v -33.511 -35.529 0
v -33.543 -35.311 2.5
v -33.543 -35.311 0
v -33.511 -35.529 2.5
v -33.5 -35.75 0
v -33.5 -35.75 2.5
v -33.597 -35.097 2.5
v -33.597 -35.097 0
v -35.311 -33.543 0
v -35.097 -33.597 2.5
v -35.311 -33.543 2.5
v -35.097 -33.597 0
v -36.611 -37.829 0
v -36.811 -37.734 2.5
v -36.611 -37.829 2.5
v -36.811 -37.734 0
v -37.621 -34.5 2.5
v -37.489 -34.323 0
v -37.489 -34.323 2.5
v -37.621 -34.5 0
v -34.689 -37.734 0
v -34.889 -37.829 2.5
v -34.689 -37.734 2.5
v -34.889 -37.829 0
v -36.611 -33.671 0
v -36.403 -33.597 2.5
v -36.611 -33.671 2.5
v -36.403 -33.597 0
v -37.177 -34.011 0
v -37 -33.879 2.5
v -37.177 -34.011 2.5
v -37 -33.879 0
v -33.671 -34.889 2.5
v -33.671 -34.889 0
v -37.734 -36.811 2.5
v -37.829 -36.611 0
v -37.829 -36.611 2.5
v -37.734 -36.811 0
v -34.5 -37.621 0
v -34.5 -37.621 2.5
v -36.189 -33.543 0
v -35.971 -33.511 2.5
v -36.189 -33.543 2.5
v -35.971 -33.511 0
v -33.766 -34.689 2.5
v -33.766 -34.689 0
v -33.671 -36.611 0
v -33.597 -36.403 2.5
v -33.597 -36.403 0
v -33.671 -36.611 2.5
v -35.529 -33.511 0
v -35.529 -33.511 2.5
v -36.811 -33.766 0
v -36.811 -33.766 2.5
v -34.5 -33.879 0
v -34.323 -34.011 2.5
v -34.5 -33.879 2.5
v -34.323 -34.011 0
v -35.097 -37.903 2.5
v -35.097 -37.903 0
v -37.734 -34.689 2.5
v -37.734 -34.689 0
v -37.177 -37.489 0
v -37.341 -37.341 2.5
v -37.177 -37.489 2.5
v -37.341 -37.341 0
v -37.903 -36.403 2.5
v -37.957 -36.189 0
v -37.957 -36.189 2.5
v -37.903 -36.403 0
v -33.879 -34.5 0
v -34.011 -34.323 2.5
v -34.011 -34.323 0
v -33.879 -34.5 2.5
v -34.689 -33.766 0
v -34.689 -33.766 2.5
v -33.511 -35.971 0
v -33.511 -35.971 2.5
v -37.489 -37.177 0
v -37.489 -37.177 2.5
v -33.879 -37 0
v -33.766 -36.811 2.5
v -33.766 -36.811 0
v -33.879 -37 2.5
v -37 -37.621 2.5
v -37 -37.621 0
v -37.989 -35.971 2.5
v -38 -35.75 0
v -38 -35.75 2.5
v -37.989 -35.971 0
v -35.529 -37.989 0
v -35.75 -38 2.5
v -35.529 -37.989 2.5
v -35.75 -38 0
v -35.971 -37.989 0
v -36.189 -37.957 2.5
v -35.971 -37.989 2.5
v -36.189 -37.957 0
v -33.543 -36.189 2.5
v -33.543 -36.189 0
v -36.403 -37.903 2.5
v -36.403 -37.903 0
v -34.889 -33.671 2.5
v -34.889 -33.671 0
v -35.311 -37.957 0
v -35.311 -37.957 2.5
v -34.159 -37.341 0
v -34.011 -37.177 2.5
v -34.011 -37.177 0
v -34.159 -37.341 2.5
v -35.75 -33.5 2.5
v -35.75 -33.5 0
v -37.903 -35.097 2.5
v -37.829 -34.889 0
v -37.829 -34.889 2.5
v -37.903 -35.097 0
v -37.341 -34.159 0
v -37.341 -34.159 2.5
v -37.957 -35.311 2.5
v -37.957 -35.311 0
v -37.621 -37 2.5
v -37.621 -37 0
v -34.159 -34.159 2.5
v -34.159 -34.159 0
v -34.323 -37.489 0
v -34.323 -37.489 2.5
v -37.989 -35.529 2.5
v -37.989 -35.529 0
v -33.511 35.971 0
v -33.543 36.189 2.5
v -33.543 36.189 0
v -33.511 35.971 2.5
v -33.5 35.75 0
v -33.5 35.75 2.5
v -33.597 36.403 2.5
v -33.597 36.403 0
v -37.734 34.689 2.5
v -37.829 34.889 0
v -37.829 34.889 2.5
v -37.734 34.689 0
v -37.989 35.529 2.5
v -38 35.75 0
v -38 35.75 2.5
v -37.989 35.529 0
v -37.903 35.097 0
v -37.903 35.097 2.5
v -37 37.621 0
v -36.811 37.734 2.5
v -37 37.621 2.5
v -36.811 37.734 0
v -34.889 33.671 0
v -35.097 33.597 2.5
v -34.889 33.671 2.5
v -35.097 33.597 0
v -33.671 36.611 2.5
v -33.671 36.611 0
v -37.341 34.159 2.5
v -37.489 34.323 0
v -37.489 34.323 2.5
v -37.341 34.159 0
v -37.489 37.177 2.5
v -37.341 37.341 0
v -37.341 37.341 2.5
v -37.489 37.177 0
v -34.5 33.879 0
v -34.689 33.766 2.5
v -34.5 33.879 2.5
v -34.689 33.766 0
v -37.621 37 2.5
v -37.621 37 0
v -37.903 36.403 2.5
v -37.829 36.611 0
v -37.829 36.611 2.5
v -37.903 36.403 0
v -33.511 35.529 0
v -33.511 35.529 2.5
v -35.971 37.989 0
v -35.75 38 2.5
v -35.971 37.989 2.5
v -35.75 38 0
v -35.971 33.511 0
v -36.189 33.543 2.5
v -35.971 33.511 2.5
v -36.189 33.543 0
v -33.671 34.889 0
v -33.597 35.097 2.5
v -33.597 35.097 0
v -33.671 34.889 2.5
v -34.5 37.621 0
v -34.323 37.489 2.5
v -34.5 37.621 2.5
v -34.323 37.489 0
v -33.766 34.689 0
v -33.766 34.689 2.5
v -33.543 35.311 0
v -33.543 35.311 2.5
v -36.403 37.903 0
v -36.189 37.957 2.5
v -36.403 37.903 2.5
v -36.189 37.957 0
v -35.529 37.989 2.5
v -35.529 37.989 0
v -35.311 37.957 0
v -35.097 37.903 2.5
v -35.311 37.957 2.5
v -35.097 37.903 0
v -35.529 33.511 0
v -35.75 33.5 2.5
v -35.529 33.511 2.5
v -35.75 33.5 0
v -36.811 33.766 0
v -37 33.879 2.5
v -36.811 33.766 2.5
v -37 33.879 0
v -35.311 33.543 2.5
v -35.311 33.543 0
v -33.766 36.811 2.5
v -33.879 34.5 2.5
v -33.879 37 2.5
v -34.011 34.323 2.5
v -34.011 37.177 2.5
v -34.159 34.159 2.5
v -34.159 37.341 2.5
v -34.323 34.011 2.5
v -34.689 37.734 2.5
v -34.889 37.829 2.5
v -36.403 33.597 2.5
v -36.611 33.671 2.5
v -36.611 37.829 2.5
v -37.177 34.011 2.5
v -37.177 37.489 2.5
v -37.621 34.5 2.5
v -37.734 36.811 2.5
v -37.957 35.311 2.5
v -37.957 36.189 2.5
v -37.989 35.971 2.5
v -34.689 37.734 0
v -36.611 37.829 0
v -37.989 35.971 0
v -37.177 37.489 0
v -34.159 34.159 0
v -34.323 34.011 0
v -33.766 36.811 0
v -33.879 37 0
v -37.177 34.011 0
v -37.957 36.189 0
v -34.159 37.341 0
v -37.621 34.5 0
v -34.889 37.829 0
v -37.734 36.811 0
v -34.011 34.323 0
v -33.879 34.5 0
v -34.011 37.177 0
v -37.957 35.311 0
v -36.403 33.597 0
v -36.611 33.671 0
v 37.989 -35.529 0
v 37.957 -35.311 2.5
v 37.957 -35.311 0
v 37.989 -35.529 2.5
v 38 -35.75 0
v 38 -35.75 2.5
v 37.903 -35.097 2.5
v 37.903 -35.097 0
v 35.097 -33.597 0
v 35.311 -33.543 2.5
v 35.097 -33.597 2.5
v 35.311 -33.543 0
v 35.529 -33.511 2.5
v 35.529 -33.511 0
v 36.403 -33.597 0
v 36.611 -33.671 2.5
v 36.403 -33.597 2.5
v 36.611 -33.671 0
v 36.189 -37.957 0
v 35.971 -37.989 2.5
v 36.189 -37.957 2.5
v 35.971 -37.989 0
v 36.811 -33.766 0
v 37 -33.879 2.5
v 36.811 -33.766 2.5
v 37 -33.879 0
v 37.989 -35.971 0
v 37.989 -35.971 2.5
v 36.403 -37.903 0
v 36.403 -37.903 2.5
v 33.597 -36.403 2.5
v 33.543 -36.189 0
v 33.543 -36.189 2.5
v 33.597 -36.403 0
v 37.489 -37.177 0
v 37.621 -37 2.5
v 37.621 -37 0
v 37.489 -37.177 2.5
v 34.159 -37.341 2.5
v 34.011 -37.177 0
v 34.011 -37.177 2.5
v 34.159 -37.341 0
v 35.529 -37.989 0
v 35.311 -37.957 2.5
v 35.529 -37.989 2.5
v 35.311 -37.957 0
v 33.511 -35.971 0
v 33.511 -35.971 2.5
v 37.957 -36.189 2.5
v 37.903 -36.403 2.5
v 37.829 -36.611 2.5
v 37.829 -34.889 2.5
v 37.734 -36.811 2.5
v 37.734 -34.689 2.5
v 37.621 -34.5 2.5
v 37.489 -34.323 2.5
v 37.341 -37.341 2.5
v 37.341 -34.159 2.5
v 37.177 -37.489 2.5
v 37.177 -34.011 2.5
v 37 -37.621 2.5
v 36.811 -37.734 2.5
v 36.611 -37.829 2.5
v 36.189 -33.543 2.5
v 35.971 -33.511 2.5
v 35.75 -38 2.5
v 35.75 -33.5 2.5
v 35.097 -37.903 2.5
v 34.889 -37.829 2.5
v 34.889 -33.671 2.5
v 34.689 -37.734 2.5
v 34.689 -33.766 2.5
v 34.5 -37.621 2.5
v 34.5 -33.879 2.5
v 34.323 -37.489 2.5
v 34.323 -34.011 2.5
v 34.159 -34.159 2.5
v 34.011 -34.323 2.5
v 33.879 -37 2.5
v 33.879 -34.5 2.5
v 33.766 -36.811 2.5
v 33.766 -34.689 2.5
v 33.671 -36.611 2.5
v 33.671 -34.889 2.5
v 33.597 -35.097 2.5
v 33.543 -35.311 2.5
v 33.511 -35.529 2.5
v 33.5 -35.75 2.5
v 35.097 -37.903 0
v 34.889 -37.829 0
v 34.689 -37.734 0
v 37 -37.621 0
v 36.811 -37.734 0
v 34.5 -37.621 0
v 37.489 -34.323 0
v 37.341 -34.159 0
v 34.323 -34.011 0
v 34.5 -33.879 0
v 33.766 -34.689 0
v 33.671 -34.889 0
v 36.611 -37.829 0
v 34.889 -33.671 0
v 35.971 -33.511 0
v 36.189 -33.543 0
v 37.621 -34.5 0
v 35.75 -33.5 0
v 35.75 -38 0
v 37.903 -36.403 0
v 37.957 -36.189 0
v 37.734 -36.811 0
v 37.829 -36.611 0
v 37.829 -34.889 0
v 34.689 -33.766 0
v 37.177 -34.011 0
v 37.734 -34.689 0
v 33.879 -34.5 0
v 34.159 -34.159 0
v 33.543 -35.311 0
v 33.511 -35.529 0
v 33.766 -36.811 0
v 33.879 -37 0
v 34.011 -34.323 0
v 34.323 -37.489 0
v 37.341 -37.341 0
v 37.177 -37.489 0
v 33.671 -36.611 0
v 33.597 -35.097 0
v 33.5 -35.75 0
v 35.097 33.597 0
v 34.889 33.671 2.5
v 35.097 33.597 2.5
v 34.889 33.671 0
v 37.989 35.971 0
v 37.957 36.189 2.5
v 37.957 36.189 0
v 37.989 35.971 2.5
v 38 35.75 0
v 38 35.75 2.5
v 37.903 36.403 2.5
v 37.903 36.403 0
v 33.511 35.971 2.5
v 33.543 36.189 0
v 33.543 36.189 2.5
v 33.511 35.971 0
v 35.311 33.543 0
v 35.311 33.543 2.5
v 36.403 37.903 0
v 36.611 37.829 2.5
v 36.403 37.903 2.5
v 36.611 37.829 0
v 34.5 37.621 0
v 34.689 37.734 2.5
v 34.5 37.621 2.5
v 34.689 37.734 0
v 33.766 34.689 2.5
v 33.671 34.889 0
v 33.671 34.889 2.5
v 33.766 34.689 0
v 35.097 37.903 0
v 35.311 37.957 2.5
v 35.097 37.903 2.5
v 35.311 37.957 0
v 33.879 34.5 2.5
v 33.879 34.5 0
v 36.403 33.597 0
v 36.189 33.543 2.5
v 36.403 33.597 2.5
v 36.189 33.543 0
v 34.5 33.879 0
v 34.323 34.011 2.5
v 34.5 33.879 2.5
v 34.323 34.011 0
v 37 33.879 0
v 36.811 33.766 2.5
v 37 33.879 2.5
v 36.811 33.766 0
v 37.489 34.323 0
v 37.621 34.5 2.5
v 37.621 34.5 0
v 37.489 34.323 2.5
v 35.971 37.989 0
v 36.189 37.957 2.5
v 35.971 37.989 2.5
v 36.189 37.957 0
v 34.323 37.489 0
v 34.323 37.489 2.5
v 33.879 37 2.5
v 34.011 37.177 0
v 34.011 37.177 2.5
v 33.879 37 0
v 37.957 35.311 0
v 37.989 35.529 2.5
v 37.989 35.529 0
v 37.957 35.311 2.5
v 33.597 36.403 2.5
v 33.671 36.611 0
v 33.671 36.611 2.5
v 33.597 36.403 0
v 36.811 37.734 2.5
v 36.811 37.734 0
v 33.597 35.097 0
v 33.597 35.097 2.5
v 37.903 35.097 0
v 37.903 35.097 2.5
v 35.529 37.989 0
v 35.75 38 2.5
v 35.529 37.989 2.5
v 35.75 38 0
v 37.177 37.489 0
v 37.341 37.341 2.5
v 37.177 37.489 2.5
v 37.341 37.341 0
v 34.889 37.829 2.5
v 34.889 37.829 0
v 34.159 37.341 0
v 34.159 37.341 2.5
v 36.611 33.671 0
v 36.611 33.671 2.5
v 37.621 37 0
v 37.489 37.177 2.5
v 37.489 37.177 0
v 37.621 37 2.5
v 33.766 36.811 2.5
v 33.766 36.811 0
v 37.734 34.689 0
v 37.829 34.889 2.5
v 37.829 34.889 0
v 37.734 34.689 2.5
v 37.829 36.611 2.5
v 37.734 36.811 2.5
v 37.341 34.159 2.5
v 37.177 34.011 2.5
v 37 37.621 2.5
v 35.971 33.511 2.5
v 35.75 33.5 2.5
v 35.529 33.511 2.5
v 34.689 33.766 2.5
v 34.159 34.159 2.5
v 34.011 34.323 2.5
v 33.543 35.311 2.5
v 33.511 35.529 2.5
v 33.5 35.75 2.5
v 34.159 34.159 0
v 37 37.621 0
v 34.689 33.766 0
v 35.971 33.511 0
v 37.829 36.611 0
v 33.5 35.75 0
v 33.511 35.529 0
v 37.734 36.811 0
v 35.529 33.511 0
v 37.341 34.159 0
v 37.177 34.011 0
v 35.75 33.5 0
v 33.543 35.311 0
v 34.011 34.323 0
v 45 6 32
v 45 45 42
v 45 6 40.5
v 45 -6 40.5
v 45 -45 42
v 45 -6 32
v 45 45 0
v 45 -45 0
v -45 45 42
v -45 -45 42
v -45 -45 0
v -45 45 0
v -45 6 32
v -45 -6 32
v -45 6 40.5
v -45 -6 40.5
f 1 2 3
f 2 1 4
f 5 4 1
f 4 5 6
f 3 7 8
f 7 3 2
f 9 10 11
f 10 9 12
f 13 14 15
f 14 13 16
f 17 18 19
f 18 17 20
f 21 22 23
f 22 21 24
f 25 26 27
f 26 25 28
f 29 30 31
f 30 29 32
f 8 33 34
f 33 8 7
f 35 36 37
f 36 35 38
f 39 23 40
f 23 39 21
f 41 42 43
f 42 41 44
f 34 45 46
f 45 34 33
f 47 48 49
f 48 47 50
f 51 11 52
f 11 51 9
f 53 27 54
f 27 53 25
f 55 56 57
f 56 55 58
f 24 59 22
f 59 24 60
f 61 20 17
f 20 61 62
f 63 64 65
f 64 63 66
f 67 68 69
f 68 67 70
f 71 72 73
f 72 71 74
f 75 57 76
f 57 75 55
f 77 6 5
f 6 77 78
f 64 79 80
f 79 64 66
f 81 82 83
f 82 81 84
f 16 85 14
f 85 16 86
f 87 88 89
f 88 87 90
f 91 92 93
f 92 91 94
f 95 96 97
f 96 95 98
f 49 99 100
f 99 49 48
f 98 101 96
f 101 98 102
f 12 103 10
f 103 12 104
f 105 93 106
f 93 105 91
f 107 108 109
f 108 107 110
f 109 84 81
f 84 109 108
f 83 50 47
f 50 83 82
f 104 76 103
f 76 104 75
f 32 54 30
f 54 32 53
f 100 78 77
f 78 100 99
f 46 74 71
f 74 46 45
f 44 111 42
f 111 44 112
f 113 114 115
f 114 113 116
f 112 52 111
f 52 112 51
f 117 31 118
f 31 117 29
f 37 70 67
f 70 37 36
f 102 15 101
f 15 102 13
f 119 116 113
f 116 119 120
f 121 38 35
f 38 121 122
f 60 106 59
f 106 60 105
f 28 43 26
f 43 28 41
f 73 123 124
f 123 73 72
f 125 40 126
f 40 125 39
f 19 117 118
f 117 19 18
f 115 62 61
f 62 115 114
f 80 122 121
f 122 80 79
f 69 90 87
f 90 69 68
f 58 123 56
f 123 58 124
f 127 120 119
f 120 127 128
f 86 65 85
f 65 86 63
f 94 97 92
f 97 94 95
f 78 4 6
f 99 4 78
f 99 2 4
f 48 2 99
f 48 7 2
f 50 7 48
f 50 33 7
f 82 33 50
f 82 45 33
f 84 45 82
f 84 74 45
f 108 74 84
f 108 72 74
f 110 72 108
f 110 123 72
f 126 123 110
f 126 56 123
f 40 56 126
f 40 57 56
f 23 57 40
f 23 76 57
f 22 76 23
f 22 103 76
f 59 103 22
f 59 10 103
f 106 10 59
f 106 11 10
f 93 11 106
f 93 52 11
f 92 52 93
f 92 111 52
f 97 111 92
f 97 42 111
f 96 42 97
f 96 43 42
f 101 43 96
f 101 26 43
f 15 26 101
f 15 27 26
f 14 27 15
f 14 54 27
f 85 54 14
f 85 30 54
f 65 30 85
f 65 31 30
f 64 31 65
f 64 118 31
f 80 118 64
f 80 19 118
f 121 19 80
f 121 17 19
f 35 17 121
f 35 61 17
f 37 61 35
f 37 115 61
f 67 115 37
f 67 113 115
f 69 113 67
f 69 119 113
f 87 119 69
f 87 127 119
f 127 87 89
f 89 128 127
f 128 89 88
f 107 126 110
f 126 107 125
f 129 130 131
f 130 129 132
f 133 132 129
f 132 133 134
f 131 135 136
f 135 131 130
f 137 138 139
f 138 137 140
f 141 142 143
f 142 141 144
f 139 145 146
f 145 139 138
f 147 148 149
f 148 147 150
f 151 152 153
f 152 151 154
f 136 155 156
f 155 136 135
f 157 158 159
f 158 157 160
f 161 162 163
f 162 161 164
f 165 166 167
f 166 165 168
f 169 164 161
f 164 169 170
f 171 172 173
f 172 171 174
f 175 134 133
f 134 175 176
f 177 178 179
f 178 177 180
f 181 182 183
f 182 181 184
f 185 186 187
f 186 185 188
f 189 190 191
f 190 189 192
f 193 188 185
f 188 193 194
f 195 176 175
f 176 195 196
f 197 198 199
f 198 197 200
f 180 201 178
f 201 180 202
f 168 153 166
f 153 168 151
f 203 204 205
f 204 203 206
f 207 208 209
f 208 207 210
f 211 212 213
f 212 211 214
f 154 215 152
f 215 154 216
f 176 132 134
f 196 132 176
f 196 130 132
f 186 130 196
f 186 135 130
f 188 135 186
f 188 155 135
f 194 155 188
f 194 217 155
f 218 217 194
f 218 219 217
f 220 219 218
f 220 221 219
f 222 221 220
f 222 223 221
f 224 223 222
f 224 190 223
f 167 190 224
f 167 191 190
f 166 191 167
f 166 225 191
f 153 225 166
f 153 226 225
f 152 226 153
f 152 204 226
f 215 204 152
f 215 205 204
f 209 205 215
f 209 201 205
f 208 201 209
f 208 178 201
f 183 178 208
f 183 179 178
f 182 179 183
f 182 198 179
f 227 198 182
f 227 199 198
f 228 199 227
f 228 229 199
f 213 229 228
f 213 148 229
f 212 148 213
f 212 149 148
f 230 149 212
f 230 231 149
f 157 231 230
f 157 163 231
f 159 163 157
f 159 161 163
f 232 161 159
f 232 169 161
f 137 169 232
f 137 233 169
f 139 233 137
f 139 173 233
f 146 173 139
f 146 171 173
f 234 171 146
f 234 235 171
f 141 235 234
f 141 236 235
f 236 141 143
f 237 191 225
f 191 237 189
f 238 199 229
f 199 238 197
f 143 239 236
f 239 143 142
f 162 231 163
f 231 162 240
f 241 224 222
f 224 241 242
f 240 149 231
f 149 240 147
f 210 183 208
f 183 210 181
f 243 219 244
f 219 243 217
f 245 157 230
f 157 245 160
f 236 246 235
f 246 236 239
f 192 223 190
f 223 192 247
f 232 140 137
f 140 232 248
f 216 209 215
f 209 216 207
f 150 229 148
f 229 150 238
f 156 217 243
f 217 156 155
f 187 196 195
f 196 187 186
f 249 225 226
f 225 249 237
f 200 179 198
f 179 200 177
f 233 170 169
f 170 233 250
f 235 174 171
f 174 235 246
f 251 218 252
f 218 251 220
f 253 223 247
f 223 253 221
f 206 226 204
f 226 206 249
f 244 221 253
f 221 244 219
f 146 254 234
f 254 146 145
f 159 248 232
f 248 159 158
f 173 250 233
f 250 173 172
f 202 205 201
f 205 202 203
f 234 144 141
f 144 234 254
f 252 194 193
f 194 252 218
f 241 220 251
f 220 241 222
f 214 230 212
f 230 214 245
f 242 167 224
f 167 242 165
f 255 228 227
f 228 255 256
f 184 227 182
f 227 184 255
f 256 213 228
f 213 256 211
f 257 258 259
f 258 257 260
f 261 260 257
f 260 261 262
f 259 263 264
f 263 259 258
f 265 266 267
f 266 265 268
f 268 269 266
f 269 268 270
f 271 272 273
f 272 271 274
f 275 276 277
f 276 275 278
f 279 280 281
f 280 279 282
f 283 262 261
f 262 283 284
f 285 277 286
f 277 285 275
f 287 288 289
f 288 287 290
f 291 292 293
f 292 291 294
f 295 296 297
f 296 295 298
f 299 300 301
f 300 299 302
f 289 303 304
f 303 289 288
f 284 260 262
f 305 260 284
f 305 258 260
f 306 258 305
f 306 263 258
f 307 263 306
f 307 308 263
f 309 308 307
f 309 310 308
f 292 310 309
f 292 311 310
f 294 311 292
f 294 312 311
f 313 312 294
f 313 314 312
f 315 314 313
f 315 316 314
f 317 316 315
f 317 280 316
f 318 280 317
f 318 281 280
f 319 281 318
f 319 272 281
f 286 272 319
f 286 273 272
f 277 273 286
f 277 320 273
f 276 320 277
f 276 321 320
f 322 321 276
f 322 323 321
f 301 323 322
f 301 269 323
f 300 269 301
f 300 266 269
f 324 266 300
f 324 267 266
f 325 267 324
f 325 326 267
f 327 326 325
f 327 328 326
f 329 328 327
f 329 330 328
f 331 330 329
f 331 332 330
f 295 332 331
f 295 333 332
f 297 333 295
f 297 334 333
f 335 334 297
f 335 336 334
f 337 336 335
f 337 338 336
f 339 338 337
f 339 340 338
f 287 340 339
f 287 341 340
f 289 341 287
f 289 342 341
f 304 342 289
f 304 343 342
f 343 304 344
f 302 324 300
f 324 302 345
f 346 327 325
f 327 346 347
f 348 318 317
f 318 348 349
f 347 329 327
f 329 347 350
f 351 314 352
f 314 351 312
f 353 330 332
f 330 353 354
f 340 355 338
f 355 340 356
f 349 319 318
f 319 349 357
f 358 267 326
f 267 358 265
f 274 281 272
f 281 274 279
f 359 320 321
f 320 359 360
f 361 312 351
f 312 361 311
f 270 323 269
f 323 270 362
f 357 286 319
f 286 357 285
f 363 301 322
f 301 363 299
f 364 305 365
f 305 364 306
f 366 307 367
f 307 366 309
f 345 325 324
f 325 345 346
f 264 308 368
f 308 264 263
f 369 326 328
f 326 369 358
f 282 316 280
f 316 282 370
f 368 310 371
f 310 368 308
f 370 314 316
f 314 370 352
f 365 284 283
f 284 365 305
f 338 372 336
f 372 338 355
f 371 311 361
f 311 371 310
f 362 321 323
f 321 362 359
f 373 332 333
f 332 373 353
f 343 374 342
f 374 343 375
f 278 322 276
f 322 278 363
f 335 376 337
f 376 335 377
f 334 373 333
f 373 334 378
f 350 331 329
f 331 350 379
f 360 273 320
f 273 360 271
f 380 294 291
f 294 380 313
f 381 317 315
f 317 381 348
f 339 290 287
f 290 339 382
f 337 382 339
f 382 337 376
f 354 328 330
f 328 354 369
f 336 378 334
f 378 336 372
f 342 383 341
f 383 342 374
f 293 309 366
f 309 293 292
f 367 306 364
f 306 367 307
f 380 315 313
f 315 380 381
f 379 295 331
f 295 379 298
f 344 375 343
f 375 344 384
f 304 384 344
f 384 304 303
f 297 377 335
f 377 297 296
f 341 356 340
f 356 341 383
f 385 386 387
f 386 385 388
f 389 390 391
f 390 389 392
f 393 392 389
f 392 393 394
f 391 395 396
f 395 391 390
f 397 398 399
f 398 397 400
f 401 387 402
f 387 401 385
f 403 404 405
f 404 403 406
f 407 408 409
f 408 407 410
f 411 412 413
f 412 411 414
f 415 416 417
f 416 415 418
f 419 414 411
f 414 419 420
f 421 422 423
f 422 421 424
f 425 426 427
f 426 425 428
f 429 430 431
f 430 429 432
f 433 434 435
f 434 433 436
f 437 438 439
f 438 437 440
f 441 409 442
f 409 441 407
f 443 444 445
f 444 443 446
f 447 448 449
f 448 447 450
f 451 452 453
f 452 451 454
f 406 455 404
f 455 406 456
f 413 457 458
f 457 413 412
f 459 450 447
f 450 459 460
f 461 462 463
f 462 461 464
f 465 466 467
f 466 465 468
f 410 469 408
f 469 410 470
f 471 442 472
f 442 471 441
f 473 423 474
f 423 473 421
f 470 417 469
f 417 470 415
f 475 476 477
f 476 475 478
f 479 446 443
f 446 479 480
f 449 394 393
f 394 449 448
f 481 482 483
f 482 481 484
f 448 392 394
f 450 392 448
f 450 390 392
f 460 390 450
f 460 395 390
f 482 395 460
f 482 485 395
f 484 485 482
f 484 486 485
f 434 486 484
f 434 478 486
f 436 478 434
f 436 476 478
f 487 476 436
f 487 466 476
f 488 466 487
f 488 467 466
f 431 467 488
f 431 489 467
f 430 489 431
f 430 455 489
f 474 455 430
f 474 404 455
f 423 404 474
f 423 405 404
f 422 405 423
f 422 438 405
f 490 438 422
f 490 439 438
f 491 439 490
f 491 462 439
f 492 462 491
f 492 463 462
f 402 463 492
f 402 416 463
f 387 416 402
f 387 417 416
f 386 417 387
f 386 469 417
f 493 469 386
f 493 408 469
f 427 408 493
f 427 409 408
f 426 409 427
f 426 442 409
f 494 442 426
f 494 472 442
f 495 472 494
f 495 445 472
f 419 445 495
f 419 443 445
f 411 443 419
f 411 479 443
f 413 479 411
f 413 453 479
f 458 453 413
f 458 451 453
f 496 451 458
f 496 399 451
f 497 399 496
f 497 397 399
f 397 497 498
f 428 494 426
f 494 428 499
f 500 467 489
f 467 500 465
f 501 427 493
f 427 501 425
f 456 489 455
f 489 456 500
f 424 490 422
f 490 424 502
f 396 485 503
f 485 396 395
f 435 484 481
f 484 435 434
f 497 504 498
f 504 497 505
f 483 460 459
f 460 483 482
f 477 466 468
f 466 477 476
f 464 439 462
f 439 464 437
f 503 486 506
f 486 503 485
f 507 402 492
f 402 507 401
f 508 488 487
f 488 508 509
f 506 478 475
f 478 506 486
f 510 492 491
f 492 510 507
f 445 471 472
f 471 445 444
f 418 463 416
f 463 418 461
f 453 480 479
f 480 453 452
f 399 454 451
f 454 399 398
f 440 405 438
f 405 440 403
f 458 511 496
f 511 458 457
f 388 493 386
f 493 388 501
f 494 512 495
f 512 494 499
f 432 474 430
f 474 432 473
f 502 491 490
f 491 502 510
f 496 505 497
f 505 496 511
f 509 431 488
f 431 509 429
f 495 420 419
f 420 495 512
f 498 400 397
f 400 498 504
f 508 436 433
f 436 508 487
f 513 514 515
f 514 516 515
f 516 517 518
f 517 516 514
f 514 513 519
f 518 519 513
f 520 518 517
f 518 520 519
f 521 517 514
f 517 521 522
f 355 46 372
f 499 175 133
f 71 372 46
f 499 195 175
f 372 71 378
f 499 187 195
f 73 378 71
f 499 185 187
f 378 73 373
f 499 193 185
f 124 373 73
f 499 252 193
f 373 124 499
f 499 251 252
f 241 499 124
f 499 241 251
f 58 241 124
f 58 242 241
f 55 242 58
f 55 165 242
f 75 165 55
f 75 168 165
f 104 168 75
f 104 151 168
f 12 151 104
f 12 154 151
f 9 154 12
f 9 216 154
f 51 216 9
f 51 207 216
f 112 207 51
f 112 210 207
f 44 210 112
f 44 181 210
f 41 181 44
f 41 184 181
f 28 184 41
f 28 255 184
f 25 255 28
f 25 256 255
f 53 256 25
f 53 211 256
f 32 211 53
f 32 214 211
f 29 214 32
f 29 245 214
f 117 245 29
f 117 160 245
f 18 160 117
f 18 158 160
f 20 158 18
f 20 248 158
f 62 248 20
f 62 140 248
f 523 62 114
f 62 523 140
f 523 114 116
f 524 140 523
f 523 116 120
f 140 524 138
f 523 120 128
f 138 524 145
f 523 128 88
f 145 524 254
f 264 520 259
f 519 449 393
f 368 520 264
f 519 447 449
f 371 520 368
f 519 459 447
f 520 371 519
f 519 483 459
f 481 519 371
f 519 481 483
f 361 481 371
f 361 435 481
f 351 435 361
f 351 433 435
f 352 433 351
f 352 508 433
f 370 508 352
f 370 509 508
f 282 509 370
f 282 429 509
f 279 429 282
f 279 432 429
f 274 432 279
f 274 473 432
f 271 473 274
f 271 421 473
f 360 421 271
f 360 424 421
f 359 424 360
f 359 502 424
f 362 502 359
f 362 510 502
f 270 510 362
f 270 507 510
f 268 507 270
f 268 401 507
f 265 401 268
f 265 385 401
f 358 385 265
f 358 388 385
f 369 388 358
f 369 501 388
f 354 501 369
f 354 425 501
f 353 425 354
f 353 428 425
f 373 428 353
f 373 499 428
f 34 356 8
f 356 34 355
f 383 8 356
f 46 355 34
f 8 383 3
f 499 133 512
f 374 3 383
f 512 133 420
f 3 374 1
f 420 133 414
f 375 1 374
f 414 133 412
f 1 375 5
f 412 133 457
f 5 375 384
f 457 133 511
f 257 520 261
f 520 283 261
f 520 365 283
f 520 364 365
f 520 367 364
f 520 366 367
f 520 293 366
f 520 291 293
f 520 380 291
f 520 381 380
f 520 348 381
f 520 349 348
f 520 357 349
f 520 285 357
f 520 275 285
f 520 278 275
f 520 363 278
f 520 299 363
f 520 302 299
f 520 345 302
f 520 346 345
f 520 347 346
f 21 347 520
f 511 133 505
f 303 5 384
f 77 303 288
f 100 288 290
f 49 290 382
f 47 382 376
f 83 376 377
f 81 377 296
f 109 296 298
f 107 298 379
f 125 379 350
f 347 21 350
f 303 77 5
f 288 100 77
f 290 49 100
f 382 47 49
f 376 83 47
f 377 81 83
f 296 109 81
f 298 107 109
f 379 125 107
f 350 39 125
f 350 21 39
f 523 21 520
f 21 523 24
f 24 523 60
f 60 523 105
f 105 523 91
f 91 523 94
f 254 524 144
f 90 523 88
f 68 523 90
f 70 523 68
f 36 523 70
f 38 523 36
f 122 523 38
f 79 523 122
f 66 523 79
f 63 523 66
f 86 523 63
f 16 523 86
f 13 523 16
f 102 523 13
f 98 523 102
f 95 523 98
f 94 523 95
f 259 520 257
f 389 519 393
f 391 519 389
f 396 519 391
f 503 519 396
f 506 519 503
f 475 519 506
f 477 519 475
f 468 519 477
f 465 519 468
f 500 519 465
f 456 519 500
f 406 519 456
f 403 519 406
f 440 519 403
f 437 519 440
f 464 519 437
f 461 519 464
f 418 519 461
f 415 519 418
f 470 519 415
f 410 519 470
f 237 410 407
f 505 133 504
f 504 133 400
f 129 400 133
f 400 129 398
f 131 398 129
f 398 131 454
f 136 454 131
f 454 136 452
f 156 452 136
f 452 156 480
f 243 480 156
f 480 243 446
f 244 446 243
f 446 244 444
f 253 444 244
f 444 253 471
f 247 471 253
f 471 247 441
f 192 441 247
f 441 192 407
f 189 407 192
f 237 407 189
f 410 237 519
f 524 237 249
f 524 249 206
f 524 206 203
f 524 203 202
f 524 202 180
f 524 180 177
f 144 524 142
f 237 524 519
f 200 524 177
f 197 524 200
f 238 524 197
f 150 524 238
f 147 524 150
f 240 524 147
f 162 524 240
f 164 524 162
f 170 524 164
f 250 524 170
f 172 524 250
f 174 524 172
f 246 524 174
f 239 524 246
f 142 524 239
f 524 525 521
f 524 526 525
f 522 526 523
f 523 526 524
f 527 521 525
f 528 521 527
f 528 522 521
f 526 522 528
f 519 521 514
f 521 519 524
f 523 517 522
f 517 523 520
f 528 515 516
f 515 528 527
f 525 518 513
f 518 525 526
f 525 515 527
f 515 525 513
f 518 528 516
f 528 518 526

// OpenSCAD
// Magnetic stirrer housing - upside-down open box over a 80 mm PC fan
// Print orientation: top plate on bed (z = 0..2), walls rise to z = 40

$fn = 64;

// ---- Dimensions (mm) ----
top_t      = 2;     // top plate thickness
wall_t     = 2.5;   // wall thickness
box_h      = 40;    // wall height (open top at z = 40)
outer_w    = 90;    // outer size in X and Y
screw_p    = 71.5;  // square pitch of 4 screw holes
screw_d    = 4.5;   // M4 screw hole diameter
notch_w    = 12;    // cable notch width
notch_bot  = 8;     // notch depth from open edge (z = 32..40)
eps        = 0.5;   // cutter overshoot past faces

// ---- Model ----
difference() {
    // Solid block
    translate([-outer_w/2, -outer_w/2, 0])
        cube([outer_w, outer_w, box_h + top_t]);

    // Screw holes through top plate
    for (sx = [-screw_p/2, screw_p/2])
        for (sy = [-screw_p/2, screw_p/2])
            translate([sx, sy, -eps])
                cylinder(d = screw_d, h = top_t + 2*eps);

    // Cable notch in one wall (centred along wall, z = 32..40)
    translate([-outer_w/2, -notch_w/2, box_h - notch_bot])
        cube([outer_w, notch_w, notch_bot + eps]);
}
